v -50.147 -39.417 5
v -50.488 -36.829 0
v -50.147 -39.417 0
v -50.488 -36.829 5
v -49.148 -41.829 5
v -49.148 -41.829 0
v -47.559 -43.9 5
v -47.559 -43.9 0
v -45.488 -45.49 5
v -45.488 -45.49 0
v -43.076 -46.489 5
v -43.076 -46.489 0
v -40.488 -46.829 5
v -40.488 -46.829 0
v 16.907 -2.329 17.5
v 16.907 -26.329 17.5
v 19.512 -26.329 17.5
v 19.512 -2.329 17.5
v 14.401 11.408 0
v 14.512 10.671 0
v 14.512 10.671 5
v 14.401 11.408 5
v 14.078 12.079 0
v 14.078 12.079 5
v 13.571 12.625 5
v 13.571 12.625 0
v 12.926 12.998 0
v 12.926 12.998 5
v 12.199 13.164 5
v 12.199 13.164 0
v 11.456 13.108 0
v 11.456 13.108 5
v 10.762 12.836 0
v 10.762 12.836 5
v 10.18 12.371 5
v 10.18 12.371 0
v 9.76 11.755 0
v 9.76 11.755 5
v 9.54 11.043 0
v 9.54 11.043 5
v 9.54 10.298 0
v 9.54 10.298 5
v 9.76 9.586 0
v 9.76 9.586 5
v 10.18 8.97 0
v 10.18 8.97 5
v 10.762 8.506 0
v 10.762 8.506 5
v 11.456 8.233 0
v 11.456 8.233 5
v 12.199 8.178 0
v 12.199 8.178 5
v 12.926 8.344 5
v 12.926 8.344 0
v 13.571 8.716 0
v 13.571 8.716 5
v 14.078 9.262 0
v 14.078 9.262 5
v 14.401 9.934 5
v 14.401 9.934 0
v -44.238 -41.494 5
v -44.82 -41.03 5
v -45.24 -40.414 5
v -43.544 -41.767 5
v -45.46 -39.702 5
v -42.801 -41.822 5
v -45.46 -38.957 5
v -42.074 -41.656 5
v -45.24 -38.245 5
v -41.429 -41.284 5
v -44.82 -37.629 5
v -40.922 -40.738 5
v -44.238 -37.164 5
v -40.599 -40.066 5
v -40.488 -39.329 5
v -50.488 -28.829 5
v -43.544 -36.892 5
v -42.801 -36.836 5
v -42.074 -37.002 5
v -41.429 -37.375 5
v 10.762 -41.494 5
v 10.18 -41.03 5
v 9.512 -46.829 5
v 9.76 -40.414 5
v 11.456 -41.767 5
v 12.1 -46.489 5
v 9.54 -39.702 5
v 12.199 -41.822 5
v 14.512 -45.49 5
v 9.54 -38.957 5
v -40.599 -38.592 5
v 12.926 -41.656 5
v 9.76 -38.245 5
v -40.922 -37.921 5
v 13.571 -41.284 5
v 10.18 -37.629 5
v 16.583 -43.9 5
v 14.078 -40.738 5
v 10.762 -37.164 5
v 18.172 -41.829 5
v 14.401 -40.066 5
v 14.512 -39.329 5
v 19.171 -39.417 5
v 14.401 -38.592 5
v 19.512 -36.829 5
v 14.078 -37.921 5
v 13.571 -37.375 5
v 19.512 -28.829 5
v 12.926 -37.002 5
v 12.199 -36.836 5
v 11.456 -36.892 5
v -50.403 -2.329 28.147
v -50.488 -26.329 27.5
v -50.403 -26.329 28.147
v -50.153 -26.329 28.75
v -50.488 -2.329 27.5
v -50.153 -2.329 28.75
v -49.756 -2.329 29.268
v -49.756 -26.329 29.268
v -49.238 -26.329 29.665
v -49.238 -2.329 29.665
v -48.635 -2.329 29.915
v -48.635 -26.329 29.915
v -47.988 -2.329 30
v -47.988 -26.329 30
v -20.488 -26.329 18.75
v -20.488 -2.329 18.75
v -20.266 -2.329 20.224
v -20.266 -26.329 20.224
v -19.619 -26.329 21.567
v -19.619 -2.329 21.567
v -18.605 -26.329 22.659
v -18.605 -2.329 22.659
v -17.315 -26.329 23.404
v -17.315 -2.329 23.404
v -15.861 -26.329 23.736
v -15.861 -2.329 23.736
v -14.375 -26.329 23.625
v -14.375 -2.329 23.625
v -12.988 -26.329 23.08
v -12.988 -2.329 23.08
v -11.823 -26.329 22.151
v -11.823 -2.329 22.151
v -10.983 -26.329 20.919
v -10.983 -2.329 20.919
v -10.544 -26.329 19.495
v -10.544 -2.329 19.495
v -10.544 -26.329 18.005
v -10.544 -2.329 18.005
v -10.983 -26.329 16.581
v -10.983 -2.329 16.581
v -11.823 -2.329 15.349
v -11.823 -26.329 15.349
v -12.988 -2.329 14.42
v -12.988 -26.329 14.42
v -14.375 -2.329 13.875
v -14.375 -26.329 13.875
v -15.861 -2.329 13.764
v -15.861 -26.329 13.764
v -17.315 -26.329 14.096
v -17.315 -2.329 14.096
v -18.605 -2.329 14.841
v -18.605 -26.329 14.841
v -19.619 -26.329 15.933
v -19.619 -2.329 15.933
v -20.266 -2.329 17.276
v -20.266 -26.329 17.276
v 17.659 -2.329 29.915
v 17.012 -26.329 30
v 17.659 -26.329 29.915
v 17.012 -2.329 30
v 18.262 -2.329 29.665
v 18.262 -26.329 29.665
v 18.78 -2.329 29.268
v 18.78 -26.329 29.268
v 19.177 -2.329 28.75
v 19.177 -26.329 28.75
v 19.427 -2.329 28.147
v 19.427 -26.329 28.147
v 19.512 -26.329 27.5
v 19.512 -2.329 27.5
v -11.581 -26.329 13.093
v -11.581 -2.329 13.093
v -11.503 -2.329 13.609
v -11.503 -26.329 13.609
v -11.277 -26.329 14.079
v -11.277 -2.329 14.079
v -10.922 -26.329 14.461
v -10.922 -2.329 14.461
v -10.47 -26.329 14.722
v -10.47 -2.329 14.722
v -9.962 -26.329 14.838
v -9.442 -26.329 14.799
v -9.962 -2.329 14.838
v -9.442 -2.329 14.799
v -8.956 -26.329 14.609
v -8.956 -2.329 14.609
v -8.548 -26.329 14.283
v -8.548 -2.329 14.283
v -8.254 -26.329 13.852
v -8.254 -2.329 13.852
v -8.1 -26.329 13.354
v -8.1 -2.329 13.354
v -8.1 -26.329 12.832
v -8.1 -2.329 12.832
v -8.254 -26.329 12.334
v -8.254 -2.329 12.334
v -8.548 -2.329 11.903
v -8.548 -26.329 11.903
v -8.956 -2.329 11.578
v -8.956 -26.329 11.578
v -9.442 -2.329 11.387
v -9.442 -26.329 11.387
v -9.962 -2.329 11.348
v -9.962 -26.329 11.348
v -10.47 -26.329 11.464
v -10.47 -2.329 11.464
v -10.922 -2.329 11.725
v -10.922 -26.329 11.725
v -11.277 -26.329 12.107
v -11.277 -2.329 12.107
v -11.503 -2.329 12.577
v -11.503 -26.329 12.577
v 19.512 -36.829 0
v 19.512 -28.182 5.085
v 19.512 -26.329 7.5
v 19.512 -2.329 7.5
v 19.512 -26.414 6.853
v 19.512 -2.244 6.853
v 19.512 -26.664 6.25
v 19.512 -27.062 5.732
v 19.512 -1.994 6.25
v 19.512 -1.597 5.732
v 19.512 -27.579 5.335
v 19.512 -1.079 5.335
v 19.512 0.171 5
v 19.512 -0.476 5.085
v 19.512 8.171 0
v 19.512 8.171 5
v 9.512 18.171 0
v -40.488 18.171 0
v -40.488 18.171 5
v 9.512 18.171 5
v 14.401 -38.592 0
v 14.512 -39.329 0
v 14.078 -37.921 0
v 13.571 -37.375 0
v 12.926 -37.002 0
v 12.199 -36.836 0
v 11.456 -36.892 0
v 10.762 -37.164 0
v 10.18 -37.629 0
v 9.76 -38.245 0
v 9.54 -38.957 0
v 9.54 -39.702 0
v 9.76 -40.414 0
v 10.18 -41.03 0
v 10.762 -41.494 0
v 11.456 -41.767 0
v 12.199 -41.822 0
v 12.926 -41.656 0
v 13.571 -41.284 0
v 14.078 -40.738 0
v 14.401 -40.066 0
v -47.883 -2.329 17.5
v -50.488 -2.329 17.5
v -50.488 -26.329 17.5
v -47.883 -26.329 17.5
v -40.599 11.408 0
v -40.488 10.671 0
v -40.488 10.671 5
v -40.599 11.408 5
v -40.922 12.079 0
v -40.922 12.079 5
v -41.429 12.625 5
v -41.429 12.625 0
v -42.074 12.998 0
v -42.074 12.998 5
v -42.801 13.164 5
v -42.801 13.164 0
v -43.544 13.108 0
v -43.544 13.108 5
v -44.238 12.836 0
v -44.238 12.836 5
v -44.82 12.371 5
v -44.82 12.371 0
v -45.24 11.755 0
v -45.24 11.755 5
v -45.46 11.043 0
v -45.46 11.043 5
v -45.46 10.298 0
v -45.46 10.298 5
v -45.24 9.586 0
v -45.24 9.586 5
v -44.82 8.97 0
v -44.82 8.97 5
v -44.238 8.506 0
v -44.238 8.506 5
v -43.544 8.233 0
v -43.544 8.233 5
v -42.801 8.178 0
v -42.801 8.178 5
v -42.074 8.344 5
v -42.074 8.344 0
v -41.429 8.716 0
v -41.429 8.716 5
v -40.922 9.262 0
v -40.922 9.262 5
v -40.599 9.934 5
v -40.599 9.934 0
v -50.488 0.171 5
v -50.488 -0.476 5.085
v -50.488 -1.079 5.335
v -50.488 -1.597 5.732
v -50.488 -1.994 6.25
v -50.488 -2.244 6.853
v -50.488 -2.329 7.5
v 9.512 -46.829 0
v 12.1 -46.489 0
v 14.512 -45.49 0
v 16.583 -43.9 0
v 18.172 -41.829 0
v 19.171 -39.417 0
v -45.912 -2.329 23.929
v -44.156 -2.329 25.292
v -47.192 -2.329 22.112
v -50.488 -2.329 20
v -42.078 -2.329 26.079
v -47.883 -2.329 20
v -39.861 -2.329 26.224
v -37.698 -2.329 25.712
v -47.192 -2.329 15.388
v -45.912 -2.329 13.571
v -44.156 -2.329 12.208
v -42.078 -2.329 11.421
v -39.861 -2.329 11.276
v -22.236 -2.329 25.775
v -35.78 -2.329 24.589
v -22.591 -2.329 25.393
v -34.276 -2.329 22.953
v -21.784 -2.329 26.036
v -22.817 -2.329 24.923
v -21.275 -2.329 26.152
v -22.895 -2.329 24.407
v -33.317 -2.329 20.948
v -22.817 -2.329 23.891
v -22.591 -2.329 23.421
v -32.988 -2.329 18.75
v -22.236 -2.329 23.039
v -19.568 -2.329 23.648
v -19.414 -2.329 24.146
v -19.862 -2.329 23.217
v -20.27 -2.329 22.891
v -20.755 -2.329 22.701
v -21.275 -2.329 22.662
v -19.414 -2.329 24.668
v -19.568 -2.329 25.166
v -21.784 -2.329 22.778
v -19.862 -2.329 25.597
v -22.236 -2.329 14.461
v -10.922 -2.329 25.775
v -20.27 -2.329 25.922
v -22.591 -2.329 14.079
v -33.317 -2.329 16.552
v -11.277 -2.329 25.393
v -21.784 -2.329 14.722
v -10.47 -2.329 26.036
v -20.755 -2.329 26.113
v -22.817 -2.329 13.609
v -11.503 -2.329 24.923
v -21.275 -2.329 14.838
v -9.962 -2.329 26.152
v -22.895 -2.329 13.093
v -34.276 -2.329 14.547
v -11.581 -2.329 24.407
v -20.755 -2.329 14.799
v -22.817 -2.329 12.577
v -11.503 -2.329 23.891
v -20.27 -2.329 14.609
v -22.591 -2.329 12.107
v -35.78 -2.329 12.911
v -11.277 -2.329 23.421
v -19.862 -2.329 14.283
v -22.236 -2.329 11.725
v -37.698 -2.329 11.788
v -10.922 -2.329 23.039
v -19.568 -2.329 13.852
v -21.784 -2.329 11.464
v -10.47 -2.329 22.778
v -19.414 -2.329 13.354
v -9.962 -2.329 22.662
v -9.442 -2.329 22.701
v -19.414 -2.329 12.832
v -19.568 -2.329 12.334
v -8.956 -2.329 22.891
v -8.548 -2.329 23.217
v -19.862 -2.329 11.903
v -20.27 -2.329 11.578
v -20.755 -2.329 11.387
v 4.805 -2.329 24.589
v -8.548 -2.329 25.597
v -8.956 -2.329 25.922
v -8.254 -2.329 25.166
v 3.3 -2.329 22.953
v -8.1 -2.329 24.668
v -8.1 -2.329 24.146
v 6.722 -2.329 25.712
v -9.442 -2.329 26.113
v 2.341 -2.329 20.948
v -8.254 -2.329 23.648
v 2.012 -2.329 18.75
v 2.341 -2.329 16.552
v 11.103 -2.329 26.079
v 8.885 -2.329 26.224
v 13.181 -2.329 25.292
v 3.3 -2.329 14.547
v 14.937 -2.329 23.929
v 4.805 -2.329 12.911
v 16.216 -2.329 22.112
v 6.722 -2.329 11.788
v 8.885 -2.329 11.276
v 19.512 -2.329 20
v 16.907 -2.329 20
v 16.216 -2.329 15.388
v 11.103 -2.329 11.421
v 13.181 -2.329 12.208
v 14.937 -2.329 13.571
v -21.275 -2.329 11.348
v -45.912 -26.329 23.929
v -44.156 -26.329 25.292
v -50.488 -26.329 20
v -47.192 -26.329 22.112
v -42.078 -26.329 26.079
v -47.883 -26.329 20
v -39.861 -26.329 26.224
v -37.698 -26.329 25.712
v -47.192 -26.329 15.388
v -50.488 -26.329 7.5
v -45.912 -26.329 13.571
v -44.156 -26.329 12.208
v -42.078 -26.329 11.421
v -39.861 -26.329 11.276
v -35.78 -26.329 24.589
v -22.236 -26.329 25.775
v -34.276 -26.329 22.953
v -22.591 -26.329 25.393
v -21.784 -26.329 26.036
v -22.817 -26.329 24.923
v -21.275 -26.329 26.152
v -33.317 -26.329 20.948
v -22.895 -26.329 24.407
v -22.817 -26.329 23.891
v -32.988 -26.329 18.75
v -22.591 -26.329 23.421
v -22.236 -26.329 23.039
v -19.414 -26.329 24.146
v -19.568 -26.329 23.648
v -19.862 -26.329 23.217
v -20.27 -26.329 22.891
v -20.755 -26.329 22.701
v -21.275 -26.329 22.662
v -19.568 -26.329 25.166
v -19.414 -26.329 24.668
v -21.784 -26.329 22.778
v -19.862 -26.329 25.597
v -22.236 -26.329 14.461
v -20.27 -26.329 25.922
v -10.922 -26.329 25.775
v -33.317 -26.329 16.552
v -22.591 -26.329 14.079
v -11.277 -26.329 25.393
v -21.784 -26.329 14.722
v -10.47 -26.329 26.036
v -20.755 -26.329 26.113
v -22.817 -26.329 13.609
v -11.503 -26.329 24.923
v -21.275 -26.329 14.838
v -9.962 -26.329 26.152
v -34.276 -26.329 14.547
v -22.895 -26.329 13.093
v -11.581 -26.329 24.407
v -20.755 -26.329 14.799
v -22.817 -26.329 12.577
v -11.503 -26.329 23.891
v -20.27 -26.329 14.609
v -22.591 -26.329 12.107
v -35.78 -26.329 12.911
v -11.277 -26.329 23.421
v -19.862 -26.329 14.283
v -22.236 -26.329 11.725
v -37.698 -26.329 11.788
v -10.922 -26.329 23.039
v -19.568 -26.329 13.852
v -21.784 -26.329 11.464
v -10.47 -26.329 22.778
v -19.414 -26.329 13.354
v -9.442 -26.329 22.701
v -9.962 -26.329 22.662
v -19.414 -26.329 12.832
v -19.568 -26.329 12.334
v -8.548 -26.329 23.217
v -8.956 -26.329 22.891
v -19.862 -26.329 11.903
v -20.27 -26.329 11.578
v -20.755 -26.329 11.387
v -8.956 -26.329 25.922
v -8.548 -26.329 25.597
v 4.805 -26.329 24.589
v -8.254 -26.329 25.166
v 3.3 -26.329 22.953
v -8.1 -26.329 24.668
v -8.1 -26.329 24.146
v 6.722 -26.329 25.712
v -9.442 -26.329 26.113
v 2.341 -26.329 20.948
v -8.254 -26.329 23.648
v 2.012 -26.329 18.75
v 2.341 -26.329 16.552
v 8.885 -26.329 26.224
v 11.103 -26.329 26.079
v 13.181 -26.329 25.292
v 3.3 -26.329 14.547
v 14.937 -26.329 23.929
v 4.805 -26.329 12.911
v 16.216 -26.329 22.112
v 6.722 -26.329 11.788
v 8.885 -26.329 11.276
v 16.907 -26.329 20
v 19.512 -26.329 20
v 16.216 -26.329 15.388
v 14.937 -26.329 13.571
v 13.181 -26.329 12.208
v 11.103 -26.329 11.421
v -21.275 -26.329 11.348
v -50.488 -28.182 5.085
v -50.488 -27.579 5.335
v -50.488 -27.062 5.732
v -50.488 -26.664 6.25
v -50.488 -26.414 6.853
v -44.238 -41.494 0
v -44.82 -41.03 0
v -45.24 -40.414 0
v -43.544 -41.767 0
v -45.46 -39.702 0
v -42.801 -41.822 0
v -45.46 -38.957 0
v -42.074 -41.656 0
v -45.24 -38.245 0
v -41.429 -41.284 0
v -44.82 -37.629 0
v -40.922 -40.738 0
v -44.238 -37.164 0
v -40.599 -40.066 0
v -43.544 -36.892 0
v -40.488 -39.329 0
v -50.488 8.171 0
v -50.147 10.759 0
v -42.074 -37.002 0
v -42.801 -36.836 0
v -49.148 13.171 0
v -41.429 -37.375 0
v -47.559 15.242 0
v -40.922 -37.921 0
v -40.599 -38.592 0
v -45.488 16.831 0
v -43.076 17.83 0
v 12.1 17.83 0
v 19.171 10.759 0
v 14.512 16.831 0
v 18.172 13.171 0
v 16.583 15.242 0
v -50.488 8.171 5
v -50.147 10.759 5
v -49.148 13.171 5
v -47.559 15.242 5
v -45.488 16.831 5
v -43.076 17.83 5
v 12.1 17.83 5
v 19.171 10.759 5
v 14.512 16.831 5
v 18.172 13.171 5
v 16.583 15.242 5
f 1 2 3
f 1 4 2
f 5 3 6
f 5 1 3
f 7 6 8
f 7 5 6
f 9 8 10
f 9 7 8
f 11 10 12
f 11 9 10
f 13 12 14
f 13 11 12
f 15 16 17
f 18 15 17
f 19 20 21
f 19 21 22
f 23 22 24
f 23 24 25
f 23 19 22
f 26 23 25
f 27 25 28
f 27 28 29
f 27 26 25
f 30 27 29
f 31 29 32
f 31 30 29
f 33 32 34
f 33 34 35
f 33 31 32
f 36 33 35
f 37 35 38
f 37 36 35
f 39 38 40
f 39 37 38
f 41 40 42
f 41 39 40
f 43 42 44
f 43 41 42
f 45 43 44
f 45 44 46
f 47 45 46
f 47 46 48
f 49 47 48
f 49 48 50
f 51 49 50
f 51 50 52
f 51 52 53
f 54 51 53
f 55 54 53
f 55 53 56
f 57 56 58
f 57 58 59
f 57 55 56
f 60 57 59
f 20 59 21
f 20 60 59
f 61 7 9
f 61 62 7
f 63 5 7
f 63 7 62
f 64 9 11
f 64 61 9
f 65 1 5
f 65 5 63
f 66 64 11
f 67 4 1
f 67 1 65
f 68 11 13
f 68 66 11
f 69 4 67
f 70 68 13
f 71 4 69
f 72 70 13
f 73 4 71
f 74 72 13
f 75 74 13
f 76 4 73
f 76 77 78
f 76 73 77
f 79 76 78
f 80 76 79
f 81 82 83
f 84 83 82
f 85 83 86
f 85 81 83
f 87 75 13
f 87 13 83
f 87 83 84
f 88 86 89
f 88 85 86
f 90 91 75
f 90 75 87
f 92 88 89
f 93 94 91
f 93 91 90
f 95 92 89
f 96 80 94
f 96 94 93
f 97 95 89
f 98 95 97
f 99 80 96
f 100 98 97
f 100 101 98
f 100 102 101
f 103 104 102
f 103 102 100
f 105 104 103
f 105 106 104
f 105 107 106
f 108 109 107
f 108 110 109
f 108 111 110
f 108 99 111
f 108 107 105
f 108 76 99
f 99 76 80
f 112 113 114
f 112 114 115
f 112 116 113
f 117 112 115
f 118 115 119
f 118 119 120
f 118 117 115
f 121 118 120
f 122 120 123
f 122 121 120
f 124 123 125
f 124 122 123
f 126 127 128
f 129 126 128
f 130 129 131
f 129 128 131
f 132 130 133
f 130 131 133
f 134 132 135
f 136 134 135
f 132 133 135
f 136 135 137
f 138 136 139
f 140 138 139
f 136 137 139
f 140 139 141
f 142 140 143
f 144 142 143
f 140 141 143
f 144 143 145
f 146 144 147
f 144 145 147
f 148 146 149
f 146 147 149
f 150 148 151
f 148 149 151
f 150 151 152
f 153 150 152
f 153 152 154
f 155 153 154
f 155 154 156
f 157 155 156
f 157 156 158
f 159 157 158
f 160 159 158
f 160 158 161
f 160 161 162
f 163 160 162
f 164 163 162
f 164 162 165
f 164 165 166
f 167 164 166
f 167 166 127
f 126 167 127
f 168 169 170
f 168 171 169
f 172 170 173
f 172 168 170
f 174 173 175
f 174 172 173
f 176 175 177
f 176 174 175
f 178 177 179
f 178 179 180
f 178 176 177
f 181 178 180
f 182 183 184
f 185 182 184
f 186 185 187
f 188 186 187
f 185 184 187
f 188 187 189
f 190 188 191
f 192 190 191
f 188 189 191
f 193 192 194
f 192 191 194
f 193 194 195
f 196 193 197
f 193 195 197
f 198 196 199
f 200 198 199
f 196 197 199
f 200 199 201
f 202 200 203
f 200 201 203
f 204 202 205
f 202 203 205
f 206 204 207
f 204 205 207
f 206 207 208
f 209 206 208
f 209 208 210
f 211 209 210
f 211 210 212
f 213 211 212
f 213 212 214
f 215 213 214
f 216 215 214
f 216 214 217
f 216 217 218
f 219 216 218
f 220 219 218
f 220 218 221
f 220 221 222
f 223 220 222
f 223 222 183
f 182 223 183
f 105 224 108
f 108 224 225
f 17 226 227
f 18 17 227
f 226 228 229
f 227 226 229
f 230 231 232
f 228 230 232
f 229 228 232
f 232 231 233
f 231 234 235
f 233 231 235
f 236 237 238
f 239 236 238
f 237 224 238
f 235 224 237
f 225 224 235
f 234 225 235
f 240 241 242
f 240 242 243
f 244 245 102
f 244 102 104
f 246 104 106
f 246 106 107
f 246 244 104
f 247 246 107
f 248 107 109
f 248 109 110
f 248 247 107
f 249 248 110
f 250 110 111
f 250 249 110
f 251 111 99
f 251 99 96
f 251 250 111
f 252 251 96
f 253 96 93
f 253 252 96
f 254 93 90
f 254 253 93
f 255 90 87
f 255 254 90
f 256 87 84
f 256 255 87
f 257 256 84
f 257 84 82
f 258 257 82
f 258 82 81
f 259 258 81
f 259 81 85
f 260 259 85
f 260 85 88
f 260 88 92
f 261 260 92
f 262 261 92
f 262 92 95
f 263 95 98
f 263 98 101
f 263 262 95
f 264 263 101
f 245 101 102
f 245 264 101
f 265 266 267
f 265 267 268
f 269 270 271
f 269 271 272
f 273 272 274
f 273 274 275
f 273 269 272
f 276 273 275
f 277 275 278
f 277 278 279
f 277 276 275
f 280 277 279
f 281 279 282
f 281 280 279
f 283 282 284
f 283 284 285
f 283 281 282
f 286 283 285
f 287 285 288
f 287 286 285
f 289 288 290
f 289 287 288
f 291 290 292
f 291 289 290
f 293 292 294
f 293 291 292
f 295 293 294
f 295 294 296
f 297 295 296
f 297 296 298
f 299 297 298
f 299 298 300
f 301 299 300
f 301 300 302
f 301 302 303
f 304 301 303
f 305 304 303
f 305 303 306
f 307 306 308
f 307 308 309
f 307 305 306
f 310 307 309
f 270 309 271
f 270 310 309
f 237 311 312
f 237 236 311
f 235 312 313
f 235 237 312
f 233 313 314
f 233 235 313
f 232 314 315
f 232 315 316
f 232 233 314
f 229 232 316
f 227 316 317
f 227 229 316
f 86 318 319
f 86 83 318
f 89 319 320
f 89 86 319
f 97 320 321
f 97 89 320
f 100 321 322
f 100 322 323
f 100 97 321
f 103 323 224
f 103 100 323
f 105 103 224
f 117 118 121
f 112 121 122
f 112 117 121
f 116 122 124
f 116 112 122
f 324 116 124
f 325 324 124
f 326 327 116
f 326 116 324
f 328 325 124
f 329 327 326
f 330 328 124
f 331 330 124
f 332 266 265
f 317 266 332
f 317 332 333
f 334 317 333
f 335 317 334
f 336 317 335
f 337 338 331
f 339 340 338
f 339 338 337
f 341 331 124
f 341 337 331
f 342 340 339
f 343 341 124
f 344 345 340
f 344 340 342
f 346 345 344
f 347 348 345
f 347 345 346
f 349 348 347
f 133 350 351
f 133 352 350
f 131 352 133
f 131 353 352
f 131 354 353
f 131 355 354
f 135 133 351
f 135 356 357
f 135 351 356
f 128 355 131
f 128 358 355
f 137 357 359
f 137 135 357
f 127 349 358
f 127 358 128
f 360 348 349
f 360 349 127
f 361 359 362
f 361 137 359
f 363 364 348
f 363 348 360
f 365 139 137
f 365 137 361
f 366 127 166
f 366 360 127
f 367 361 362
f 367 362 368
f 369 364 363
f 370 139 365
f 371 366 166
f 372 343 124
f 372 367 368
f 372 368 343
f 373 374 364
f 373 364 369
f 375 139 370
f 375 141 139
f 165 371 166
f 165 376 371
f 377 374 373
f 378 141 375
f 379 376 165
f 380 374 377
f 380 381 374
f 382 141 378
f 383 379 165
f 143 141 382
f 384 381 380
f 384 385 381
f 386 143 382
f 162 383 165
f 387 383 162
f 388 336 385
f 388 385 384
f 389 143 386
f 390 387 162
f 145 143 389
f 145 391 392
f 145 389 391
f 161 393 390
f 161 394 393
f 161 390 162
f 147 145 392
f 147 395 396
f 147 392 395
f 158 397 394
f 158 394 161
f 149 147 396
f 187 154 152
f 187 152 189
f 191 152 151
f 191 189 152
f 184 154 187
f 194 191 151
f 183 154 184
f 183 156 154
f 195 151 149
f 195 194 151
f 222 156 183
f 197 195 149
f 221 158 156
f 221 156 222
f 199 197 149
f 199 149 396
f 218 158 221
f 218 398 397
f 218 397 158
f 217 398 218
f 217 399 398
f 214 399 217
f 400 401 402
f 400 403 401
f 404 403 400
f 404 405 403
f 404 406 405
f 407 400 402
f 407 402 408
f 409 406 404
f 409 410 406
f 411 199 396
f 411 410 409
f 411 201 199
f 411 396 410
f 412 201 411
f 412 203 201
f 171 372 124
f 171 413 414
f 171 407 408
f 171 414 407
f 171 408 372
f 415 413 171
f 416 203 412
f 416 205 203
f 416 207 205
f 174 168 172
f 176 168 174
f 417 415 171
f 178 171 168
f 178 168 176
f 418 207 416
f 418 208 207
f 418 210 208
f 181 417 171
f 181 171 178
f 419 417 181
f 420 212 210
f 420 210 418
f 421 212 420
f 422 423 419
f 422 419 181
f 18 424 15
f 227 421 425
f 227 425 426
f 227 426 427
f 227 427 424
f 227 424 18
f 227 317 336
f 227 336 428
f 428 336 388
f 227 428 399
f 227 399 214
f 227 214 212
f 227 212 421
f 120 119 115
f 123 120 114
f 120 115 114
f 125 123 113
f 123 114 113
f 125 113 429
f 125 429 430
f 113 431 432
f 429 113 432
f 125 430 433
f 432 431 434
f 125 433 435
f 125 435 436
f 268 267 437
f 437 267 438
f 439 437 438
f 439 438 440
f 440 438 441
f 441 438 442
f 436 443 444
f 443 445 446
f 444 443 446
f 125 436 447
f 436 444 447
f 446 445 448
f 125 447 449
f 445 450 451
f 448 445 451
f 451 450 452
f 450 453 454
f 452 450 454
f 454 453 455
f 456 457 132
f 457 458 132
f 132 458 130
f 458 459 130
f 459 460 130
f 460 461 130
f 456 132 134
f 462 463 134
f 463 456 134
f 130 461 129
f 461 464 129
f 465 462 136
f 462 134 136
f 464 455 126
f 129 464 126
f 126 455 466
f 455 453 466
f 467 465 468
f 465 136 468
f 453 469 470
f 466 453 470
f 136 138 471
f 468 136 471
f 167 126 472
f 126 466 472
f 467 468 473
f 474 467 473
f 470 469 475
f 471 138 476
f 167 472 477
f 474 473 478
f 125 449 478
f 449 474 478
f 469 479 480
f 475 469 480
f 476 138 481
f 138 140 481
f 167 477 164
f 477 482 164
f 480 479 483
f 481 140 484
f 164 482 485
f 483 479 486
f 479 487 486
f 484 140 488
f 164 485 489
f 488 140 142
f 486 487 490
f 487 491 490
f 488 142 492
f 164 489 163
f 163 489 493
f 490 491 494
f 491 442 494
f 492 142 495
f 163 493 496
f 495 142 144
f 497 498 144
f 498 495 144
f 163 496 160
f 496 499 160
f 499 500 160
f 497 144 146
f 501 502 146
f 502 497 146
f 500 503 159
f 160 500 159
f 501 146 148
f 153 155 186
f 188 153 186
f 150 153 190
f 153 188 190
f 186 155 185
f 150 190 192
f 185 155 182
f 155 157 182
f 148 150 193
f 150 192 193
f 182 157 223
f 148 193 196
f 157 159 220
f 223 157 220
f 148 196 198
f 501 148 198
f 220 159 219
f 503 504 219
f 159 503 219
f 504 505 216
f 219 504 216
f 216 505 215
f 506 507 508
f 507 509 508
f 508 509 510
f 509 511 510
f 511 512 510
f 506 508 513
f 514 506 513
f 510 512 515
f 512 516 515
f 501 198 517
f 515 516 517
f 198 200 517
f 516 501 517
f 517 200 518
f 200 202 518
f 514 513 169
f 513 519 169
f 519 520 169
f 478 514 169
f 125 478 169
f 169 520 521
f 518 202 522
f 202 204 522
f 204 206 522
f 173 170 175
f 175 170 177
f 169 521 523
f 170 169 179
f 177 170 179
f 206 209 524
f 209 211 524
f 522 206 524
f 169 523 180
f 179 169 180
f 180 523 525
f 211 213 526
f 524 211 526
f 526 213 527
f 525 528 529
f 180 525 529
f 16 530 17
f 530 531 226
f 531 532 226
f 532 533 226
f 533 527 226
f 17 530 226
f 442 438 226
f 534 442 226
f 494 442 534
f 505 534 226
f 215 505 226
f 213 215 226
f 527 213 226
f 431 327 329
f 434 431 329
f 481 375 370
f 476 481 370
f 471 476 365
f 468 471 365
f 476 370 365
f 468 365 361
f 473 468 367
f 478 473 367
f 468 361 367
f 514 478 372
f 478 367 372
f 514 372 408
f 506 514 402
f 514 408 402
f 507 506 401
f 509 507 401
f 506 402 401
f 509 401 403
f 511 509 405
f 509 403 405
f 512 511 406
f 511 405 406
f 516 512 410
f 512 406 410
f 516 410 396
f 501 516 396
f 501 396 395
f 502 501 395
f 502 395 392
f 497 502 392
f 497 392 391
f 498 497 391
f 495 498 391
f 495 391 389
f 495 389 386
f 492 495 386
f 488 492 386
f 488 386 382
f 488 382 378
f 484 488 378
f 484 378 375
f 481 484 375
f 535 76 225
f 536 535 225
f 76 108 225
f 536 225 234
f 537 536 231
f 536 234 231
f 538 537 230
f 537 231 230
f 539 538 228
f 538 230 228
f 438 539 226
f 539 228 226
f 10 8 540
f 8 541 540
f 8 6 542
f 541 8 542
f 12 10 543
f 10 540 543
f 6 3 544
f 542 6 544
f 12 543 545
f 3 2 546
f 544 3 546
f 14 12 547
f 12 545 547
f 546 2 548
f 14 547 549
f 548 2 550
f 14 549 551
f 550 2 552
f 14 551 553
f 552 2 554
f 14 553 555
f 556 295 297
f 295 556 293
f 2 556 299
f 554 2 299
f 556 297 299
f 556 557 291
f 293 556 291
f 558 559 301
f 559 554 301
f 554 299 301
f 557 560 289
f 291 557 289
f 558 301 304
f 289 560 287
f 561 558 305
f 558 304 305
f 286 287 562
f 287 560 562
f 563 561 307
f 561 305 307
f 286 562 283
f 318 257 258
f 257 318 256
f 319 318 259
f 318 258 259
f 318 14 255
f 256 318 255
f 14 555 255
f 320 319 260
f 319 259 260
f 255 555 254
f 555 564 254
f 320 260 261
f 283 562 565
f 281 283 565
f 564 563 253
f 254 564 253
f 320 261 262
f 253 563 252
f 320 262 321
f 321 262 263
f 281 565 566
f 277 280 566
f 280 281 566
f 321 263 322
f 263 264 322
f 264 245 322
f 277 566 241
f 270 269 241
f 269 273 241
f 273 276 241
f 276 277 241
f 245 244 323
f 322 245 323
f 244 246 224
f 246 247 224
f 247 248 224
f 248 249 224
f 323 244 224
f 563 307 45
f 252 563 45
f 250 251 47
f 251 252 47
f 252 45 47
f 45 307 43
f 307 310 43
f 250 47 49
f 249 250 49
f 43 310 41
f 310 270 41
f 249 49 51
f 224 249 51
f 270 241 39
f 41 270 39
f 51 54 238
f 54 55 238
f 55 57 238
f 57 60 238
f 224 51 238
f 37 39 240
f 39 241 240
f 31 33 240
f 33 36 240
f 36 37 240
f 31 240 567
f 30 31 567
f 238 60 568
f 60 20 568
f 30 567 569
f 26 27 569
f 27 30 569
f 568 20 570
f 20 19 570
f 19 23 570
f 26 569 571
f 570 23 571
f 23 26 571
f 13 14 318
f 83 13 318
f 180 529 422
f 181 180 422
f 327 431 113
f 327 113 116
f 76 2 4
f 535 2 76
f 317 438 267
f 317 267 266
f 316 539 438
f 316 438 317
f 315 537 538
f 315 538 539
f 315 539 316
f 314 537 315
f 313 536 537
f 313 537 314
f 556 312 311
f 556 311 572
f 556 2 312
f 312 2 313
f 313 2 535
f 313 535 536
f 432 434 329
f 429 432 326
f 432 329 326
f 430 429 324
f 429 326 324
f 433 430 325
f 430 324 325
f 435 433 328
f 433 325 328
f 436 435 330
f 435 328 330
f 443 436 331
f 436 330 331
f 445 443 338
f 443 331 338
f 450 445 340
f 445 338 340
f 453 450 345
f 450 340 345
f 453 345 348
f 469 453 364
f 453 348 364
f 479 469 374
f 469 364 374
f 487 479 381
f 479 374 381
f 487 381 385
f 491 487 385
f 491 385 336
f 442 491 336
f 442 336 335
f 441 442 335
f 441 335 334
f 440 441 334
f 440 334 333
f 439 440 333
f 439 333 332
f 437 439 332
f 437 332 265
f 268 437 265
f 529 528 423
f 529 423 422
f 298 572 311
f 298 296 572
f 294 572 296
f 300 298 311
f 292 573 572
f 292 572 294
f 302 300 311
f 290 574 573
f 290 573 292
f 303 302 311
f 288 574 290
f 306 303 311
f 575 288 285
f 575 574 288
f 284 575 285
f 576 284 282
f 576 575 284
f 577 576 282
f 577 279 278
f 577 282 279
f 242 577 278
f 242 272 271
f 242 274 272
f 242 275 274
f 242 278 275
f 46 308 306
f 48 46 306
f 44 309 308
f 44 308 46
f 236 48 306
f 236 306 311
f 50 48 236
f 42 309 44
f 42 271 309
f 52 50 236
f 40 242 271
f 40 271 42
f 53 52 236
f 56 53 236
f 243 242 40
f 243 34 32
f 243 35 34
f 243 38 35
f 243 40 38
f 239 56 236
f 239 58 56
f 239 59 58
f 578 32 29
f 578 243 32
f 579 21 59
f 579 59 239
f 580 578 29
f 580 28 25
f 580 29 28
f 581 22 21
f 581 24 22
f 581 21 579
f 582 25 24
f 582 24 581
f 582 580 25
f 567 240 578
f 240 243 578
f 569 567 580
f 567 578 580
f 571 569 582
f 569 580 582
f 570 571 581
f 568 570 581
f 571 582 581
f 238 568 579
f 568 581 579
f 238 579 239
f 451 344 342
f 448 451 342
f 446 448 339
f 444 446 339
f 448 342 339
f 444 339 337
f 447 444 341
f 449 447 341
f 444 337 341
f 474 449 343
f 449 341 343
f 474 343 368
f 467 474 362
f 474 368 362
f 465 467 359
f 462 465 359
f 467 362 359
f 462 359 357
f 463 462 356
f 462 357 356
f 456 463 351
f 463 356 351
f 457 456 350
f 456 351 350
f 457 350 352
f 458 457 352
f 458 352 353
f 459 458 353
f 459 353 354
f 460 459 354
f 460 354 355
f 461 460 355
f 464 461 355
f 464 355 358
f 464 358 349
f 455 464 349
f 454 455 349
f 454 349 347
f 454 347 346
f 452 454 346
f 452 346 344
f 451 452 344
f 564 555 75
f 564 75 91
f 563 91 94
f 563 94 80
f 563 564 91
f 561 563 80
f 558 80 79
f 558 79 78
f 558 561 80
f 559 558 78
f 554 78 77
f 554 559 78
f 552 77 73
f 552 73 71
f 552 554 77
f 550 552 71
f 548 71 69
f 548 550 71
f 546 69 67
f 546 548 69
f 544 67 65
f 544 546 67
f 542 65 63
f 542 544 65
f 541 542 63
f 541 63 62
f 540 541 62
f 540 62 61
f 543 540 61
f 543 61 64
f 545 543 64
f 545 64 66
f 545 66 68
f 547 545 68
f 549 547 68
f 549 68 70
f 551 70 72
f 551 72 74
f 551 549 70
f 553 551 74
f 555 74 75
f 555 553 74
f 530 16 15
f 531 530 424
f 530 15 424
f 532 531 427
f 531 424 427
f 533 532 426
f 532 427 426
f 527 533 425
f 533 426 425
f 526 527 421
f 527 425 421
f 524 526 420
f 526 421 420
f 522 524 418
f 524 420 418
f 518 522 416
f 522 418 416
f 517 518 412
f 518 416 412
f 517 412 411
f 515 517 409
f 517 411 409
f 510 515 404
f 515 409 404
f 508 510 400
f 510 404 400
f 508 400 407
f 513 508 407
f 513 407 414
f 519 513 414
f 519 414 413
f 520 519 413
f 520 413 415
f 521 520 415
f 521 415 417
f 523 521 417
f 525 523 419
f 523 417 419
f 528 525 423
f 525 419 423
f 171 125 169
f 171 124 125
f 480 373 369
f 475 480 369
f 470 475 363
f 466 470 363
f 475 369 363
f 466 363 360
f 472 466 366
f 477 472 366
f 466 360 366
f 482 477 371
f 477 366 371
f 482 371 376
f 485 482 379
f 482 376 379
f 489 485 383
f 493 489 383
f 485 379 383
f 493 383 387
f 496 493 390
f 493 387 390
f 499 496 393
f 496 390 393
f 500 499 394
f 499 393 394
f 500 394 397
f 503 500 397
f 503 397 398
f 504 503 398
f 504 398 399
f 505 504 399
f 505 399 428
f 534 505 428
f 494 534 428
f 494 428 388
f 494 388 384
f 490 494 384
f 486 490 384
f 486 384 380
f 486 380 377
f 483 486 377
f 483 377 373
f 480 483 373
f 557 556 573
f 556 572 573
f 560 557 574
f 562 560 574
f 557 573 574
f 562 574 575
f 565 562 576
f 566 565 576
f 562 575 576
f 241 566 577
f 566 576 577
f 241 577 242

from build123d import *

# Parameters (mm, degrees)
SKETCH1_W           = 70
SKETCH1_H           = 65
SKETCH1_R           = 2.5
BOSS_EXTRUDE1_DEPTH = 5
FILLET1_R           = 10
SKETCH2_W           = 70
SKETCH2_H           = 24
BOSS_EXTRUDE2_DEPTH = 25
FILLET2_R           = 2.5
SKETCH3_R           = 5
SKETCH3_R_2         = 7.5
CUT_EXTRUDE1_DEPTH  = 30
SKETCH4_R           = 1.75
CUT_EXTRUDE2_DEPTH  = 30
FILLET3_R           = 2.5
SKETCH6_W           = 8.533797122
SKETCH6_H           = 2.5
SKETCH6_W_2         = 12.888873946
CUT_EXTRUDE3_DEPTH  = 30


with BuildPart() as part:
    # Sketch1 → Boss-Extrude1 (new body)
    with BuildSketch(Plane.XY):
        with Locations((-15.487804878, -14.329268293)):
            Rectangle(SKETCH1_W, SKETCH1_H)
        with Locations((-42.987804878, 10.670731707)):
            Circle(SKETCH1_R, mode=Mode.SUBTRACT)
        with Locations((12.012195122, 10.670731707)):
            Circle(SKETCH1_R, mode=Mode.SUBTRACT)
        with Locations((-42.987804878, -39.329268293)):
            Circle(SKETCH1_R, mode=Mode.SUBTRACT)
        with Locations((12.012195122, -39.329268293)):
            Circle(SKETCH1_R, mode=Mode.SUBTRACT)
    extrude(amount=BOSS_EXTRUDE1_DEPTH)

    # Fillet1
    fillet1_edges = [part.edges().sort_by_distance(p)[0] for p in [
        (-50.487804878, 18.170731707, 2.5),
        (19.512195122, 18.170731707, 2.5),
        (19.512195122, -46.829268293, 2.5),
        (-50.487804878, -46.829268293, 2.5),
    ]]
    fillet(fillet1_edges, radius=FILLET1_R)

    # Sketch2 → Boss-Extrude2 (add)
    with BuildSketch(Plane.XY.offset(5)):
        with Locations((-15.487804878, -14.329268293)):
            Rectangle(SKETCH2_W, SKETCH2_H)
    extrude(amount=BOSS_EXTRUDE2_DEPTH)

    # Fillet2
    fillet2_edges = [part.edges().sort_by_distance(p)[0] for p in [
        (-15.487804878, -26.329268293, 5),
        (-15.487804878, -2.329268293, 5),
    ]]
    fillet(fillet2_edges, radius=FILLET2_R)

    # Sketch3 → Cut-Extrude1 (cut)
    with BuildSketch(Plane(origin=(0, -2.329268293, 0), x_dir=(1, 0, 0), z_dir=(0, 1, 0))):
        with Locations(Location((-15.487804878, -18.75, 0), (0, 0, 180))):
            Circle(SKETCH3_R)
        with Locations(Location((-40.487804878, -18.75, 0), (0, 0, 180))):
            Circle(SKETCH3_R_2)
        with Locations(Location((9.512195122, -18.75, 0), (0, 0, 180))):
            Circle(SKETCH3_R_2)
    extrude(amount=-CUT_EXTRUDE1_DEPTH, mode=Mode.SUBTRACT)

    # Sketch4 → Cut-Extrude2 (cut)
    with BuildSketch(Plane(origin=(0, -2.329268293, 0), x_dir=(1, 0, 0), z_dir=(0, 1, 0))):
        with Locations(Location((-21.144659128, -13.093145751, 0), (0, 0, 180))):
            Circle(SKETCH4_R)
        with Locations(Location((-9.830950629, -13.093145751, 0), (0, 0, 180))):
            Circle(SKETCH4_R)
        with Locations(Location((-9.830950629, -24.406854249, 0), (0, 0, 180))):
            Circle(SKETCH4_R)
        with Locations(Location((-21.144659128, -24.406854249, 0), (0, 0, 180))):
            Circle(SKETCH4_R)
    extrude(amount=-CUT_EXTRUDE2_DEPTH, mode=Mode.SUBTRACT)

    # Fillet3
    fillet3_edges = [part.edges().sort_by_distance(p)[0] for p in [
        (-50.487804878, -14.329268293, 30),
        (19.512195122, -14.329268293, 30),
    ]]
    fillet(fillet3_edges, radius=FILLET3_R)

    # Sketch6 → Cut-Extrude3 (cut)
    with BuildSketch(Plane(origin=(0, -2.329268293, 0), x_dir=(1, 0, 0), z_dir=(0, 1, 0))):
        with Locations((-47.987804878, -18.75)):
            Rectangle(SKETCH6_W, SKETCH6_H)
        with Locations((17.012195122, -18.75)):
            Rectangle(SKETCH6_W_2, SKETCH6_H)
    extrude(amount=-CUT_EXTRUDE3_DEPTH, mode=Mode.SUBTRACT)


solid = part.part
